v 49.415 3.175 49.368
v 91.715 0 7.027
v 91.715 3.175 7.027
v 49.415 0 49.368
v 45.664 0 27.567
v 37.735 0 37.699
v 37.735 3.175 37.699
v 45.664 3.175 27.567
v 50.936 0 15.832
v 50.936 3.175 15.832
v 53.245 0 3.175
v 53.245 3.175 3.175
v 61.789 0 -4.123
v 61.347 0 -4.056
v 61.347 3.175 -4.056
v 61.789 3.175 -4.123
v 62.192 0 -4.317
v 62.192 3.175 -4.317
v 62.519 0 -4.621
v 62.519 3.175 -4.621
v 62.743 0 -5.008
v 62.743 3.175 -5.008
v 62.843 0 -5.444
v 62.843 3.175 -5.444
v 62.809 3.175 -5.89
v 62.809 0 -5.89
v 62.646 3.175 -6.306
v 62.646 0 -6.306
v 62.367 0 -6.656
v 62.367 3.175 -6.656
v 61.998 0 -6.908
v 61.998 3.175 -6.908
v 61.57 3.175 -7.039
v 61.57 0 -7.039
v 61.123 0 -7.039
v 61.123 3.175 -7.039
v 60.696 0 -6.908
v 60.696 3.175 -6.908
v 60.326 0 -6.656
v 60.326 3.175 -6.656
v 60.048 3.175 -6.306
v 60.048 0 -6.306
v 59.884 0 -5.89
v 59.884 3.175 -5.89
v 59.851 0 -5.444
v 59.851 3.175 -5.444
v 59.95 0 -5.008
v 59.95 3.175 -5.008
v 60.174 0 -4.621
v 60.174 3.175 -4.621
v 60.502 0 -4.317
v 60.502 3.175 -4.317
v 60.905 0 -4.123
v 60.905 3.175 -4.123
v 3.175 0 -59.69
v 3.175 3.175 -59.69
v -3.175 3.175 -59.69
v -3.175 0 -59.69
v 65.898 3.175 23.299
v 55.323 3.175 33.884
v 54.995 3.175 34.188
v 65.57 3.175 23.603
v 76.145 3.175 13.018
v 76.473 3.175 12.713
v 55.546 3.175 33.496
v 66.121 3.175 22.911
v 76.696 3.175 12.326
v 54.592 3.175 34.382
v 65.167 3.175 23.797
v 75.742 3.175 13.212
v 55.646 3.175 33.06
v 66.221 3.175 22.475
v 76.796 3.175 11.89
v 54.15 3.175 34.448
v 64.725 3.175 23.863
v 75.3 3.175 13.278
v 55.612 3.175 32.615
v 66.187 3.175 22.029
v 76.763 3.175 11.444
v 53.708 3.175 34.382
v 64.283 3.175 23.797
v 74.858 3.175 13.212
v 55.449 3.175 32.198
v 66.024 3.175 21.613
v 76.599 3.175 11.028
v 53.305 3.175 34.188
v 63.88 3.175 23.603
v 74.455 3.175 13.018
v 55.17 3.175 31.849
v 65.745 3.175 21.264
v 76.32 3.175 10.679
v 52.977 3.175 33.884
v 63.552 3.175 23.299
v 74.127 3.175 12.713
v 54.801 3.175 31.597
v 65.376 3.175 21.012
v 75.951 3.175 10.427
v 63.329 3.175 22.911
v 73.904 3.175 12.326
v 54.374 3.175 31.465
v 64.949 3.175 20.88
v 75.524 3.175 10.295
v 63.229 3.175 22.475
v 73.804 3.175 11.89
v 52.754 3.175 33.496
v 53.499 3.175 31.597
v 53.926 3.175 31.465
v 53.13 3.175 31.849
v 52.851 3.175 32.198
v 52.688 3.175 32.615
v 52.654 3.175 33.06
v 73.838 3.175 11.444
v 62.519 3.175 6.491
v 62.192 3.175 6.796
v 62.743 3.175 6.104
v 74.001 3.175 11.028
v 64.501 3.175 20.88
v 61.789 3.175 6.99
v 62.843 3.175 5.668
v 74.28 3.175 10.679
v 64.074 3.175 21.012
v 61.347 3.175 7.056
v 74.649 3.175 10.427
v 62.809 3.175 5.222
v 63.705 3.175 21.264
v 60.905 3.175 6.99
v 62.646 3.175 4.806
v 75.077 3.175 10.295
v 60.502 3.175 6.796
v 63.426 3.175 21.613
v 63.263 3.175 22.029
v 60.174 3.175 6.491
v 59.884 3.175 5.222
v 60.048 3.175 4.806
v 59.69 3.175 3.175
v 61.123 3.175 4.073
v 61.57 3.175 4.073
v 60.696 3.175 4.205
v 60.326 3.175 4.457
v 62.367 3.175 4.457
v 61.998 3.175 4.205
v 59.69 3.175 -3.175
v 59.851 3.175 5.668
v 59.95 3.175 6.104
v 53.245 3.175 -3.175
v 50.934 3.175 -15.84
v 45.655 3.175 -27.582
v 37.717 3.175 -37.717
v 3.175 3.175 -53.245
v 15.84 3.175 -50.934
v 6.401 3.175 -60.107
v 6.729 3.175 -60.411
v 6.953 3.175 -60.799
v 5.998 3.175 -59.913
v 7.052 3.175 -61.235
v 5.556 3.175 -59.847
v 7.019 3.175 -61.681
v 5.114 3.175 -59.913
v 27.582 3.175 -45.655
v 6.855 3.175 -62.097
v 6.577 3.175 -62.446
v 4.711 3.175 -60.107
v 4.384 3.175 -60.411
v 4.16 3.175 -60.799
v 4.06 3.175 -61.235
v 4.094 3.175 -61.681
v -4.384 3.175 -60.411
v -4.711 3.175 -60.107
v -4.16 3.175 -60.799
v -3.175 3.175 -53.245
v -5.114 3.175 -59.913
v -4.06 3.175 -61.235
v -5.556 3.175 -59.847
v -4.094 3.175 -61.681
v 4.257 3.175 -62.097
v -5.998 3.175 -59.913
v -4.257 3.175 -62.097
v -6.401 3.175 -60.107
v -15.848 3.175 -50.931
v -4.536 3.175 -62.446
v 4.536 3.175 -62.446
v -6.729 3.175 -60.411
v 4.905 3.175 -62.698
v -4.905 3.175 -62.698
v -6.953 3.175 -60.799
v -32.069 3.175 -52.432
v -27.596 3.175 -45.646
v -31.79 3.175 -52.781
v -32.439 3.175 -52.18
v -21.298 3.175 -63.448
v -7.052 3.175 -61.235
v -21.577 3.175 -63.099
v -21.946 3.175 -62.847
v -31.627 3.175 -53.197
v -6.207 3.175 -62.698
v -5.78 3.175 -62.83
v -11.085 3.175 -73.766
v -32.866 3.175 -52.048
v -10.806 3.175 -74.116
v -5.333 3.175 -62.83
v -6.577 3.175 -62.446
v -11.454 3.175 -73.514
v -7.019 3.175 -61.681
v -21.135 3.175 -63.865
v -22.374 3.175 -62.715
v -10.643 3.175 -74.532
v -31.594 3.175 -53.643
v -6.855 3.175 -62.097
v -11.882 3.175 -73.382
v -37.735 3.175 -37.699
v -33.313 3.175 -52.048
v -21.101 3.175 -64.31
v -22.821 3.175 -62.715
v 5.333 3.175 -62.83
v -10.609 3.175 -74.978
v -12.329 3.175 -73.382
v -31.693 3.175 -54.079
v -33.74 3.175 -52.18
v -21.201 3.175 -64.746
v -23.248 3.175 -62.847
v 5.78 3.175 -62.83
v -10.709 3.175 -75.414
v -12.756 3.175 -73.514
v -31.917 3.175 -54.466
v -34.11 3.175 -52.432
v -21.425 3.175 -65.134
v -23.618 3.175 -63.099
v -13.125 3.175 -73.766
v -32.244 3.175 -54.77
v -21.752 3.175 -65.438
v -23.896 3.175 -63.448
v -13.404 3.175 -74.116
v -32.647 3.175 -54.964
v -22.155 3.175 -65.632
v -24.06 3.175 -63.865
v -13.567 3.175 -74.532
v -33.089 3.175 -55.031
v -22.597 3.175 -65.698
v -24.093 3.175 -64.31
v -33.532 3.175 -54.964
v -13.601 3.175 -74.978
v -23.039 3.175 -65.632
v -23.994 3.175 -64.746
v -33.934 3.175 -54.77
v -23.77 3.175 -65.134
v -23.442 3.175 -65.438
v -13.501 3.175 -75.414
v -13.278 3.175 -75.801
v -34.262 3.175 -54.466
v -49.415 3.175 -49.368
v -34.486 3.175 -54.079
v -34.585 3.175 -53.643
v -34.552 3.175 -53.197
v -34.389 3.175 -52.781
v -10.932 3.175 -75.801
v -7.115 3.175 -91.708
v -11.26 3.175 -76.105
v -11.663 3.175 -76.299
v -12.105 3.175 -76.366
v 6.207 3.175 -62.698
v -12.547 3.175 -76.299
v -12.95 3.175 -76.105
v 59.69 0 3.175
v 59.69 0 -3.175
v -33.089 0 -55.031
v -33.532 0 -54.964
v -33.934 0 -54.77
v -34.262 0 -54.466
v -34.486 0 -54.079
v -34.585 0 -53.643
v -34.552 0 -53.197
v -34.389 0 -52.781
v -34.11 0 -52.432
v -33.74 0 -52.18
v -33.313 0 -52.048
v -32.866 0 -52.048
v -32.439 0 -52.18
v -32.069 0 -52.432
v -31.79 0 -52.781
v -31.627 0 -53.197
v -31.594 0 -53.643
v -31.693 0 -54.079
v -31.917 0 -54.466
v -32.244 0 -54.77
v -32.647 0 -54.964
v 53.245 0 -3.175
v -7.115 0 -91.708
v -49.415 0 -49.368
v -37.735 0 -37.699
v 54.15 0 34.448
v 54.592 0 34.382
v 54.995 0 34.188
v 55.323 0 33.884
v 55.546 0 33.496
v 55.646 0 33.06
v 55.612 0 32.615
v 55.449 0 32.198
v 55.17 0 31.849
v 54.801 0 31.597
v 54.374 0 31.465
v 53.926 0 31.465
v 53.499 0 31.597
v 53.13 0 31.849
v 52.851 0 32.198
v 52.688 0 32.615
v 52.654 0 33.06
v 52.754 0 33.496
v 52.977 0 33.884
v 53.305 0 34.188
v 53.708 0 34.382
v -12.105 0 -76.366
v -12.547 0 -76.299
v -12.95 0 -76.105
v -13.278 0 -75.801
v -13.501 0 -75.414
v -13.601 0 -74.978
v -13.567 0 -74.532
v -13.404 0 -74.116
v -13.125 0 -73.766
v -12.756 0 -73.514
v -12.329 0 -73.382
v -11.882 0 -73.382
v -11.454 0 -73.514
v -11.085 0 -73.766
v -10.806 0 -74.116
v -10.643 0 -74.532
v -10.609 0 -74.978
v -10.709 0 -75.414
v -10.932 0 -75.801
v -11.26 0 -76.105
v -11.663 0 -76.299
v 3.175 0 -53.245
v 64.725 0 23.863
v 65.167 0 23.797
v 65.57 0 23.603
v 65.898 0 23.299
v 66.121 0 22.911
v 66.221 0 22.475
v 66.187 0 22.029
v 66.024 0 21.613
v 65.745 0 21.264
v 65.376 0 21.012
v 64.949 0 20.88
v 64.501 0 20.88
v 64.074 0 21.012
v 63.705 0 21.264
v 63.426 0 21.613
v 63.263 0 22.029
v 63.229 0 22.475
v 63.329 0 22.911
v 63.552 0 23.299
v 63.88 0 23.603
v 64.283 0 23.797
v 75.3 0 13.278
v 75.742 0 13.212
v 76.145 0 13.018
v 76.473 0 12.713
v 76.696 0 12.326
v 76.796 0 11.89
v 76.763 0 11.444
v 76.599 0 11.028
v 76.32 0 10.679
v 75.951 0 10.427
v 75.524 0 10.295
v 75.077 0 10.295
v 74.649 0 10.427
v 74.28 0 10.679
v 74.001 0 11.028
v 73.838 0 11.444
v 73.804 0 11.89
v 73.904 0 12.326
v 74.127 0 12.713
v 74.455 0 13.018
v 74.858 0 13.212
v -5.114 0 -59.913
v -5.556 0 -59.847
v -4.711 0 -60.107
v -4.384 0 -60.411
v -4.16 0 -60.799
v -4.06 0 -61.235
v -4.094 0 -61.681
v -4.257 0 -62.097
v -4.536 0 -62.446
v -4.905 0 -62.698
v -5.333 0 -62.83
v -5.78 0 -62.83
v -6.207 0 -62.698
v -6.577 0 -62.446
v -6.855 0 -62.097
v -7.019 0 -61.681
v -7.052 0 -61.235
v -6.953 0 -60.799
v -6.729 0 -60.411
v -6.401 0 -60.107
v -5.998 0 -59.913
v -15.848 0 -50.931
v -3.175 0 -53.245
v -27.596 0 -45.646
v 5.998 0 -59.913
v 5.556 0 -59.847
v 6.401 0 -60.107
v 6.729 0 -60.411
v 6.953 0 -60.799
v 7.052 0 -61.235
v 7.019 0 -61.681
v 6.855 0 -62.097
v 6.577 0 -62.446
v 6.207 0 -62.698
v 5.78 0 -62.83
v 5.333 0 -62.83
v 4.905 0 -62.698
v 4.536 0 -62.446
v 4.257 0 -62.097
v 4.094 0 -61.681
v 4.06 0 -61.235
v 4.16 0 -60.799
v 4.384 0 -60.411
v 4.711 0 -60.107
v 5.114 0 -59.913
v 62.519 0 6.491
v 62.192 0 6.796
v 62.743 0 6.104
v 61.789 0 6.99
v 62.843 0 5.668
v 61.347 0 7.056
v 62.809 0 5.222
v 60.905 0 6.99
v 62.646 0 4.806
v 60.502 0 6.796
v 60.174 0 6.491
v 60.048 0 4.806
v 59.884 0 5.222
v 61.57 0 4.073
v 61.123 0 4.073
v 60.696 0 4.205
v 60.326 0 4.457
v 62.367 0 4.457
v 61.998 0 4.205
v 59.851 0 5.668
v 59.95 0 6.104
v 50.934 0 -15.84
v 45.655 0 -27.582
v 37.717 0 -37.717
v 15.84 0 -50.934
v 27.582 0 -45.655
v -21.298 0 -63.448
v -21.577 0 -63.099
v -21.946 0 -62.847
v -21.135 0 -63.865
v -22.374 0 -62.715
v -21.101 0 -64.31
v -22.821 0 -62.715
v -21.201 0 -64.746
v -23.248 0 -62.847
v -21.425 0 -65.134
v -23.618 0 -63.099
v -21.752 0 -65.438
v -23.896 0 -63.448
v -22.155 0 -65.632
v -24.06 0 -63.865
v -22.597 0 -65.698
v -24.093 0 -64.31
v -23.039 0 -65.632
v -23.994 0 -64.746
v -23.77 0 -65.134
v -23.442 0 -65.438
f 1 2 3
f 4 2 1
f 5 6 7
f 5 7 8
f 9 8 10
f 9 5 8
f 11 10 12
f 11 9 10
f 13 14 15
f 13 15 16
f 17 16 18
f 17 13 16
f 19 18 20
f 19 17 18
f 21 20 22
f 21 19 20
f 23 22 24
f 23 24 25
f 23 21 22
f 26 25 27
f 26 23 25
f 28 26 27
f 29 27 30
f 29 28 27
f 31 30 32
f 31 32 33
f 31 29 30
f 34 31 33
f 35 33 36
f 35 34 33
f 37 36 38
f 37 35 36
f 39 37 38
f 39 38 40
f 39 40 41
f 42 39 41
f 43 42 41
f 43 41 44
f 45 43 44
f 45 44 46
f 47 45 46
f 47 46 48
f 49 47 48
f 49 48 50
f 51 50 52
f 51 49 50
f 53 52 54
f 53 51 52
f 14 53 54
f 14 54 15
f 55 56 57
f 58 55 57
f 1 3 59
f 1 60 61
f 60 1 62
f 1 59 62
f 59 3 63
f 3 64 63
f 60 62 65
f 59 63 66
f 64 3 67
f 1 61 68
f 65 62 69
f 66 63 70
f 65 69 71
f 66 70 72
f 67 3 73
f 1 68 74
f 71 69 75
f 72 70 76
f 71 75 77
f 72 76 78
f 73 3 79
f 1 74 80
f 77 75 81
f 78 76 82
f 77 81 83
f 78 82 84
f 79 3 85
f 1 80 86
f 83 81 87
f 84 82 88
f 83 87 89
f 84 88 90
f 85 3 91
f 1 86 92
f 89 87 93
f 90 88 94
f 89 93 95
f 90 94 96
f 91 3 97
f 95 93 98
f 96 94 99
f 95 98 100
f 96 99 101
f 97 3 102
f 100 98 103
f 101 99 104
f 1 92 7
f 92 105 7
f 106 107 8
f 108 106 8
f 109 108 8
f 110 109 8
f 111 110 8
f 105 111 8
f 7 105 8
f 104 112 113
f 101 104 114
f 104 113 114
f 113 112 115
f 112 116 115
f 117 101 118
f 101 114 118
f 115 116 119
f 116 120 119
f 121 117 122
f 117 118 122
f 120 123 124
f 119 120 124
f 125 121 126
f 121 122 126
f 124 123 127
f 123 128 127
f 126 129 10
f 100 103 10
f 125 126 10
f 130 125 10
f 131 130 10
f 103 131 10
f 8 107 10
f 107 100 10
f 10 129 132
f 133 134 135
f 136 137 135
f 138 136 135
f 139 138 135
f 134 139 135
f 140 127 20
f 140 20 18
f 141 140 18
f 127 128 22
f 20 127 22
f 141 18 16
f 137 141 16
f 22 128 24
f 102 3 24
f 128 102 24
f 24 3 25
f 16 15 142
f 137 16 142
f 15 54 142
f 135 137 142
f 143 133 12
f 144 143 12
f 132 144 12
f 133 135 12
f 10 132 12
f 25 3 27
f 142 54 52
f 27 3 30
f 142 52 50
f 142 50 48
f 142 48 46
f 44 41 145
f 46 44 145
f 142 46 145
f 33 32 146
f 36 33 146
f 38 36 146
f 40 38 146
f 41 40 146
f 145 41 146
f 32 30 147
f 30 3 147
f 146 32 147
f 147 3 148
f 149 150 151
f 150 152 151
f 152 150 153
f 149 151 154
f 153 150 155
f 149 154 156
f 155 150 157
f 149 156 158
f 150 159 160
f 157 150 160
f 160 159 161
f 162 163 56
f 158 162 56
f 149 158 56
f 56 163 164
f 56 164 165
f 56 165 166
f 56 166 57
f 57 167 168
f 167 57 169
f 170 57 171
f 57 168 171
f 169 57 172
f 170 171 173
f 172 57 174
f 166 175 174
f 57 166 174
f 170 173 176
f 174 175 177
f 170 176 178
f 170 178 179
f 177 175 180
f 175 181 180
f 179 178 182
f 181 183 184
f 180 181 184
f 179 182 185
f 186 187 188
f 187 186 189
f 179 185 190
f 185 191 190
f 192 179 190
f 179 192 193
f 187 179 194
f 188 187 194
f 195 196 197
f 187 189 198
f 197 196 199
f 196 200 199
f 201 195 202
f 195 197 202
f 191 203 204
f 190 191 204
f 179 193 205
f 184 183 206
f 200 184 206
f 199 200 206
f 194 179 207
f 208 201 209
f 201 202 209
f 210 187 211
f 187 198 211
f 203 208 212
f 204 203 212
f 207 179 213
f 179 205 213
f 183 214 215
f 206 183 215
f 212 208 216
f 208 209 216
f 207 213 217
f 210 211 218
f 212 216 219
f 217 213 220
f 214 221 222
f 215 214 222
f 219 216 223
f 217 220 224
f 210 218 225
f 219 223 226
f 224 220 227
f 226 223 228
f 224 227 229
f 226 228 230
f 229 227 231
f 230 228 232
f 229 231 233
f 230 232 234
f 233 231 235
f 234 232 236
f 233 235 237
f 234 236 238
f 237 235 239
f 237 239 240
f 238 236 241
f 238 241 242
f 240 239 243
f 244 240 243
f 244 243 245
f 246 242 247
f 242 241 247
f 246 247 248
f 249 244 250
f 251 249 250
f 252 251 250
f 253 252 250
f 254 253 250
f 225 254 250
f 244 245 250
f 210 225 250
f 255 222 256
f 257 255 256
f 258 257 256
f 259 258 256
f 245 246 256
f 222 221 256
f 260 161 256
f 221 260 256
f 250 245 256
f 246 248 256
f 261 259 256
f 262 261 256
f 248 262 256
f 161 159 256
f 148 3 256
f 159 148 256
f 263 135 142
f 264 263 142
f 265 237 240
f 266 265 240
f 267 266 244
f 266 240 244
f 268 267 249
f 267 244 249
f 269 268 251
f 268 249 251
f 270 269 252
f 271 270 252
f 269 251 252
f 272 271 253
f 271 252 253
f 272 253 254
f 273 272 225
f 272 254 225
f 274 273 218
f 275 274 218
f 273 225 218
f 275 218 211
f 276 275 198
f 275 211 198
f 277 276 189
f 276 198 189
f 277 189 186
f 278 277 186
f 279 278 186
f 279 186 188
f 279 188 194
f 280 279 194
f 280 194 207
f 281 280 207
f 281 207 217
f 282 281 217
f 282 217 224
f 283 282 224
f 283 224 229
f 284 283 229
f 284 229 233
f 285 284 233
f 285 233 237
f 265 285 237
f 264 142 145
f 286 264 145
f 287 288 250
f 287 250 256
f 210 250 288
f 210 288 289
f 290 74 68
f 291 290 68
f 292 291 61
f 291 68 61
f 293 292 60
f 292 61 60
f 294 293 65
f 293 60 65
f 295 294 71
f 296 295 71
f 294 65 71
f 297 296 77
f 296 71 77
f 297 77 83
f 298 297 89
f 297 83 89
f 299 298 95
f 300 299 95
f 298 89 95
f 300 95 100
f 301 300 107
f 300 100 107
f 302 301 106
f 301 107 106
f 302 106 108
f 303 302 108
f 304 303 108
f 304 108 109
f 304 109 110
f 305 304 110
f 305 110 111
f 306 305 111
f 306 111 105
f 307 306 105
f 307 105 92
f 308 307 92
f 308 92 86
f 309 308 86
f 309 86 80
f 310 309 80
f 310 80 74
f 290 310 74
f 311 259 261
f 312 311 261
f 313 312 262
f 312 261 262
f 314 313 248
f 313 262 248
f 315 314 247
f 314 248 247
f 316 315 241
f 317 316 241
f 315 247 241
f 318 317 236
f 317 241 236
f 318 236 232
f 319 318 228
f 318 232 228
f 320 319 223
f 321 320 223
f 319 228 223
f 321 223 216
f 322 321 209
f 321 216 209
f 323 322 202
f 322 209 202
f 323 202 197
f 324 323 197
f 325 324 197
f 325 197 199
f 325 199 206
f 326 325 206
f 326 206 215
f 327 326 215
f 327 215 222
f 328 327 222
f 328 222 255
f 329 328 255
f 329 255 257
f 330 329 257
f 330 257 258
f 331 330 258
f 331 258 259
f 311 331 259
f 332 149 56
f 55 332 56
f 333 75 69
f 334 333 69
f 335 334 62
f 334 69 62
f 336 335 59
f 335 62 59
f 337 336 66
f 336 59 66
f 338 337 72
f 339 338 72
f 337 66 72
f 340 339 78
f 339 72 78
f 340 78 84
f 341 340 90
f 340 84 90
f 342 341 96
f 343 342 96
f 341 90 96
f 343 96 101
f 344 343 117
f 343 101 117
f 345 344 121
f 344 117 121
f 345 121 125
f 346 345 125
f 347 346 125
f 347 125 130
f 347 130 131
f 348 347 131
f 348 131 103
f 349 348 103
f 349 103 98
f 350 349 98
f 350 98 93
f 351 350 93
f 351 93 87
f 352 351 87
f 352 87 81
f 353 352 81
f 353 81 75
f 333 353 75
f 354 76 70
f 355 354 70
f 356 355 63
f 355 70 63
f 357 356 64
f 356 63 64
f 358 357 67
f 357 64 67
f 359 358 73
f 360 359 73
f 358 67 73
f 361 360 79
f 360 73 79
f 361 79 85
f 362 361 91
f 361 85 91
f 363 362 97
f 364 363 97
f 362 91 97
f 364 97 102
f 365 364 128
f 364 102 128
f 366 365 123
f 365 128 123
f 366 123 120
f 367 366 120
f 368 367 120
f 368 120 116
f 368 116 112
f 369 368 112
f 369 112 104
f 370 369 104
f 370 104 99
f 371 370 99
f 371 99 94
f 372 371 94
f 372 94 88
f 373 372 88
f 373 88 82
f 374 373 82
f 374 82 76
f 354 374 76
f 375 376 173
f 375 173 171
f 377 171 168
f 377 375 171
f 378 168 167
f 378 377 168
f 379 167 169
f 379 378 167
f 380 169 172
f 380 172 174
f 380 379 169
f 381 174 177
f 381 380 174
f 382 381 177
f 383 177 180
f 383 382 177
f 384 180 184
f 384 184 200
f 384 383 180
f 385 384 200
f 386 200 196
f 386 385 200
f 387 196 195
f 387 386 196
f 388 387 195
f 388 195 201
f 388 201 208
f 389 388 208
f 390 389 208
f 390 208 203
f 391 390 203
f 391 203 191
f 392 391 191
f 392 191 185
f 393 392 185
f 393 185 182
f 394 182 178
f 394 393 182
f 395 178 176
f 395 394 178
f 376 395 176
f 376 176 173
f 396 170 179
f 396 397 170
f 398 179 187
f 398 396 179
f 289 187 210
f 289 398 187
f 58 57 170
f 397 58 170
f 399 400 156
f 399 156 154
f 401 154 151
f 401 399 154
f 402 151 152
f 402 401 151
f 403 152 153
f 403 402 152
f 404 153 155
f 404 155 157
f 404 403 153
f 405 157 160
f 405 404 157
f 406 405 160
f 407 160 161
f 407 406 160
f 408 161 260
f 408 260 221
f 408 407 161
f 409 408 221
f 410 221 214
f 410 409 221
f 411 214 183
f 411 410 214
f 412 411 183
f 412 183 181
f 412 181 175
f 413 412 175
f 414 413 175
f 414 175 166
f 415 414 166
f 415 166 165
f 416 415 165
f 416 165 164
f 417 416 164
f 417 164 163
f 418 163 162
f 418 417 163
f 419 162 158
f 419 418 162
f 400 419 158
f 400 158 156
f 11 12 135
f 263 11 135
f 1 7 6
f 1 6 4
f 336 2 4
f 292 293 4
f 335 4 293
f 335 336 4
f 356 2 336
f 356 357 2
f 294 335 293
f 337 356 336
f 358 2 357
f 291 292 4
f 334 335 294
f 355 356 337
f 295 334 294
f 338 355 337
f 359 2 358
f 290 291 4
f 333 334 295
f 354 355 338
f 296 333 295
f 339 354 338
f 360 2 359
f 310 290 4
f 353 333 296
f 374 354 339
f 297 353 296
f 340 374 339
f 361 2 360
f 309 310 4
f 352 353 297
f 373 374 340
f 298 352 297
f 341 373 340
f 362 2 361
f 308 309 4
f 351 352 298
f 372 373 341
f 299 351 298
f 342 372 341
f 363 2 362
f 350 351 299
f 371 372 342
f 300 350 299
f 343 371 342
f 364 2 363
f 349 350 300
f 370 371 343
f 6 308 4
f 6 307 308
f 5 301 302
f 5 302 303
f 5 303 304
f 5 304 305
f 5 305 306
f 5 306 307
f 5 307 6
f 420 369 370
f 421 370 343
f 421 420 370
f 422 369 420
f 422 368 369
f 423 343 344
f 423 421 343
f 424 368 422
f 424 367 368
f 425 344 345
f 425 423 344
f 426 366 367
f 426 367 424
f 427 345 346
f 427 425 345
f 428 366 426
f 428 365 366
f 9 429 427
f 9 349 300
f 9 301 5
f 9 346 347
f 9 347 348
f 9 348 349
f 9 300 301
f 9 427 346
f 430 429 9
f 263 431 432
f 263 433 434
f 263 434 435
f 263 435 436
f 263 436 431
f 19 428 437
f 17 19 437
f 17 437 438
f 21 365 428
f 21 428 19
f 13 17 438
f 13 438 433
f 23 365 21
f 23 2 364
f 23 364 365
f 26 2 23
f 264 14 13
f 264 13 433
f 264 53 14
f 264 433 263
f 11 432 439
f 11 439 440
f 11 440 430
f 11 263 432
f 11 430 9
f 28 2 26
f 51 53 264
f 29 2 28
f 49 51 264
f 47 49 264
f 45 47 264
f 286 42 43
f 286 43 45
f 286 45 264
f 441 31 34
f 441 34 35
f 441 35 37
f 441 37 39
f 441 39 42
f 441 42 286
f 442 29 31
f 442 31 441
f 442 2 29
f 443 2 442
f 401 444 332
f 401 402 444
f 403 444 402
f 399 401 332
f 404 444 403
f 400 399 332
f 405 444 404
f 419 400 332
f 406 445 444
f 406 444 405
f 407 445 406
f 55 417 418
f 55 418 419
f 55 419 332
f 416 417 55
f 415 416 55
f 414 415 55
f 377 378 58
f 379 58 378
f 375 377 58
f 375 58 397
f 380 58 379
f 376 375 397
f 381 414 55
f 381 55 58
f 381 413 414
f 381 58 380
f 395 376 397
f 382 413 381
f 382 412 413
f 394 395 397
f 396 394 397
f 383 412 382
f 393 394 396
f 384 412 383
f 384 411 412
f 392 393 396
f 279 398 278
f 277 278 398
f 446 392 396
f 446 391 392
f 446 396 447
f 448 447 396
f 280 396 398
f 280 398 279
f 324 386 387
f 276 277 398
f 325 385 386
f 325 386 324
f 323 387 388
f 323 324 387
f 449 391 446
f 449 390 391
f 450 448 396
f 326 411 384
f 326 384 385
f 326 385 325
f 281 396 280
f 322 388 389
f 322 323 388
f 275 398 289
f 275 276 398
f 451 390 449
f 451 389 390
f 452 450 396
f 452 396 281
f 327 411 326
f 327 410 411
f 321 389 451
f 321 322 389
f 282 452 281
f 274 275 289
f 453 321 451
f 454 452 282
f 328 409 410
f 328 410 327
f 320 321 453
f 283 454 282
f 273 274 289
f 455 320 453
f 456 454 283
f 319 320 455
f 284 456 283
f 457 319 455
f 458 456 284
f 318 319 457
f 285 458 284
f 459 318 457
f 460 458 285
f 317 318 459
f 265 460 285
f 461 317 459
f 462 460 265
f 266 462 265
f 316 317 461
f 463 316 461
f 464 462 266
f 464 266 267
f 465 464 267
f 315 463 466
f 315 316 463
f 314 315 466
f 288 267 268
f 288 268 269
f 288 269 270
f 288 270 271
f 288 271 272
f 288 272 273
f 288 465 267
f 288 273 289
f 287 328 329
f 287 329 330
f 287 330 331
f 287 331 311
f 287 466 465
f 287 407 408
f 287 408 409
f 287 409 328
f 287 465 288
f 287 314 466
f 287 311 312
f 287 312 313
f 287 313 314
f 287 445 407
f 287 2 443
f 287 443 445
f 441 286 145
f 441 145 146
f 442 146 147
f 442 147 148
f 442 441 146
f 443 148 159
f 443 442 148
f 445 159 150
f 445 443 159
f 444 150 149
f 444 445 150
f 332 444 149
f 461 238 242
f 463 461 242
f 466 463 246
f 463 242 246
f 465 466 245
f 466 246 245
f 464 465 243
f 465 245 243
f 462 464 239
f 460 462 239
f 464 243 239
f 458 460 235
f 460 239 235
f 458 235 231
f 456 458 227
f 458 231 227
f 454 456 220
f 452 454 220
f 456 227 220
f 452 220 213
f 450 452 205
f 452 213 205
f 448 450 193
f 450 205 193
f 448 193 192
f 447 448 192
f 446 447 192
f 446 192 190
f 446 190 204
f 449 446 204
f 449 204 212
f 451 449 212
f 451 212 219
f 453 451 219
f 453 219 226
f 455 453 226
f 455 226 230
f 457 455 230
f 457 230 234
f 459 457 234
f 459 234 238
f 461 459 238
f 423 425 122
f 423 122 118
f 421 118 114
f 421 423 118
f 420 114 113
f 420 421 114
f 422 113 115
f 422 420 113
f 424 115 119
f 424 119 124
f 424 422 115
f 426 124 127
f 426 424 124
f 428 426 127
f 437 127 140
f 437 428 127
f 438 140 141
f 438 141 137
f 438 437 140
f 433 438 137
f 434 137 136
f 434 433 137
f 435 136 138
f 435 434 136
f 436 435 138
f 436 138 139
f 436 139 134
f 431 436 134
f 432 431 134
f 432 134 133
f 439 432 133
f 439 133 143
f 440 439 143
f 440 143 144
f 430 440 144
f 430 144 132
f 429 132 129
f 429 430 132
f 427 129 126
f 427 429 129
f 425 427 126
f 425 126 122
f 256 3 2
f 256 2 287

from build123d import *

# Parameters (mm, degrees)
SKETCH1_R           = 1.5
SKETCH1_R_2         = 53.34
BOSS_EXTRUDE1_DEPTH = 3.175
CUT_EXTRUDE3_DEPTH  = 140.736059076
CUT_EXTRUDE4_DEPTH  = 140.736059076
CUT_EXTRUDE5_DEPTH  = 140.736059076
SKETCH6_R           = 1.5
CUT_EXTRUDE6_DEPTH  = 130.738840902


with BuildPart() as part:
    # Sketch1 → Boss-Extrude1 (new body)
    with BuildSketch(Plane(origin=(0, 0, 0), x_dir=(1, 0, 0), z_dir=(0, 1, 0))):
        Polygon((0.047005036, -98.782806148), (-98.782806148, -0.047005036), (-0.047005036, 98.782806148), (98.782806148, 0.047005036), align=None)
        with Locations(Location((-61.346730494, 5.55625, 0), (0, 0, 270))):
            Circle(SKETCH1_R, mode=Mode.SUBTRACT)
        with Locations(Location((-61.346730494, -5.55625, 0), (0, 0, 270))):
            Circle(SKETCH1_R, mode=Mode.SUBTRACT)
        with Locations(Location((-5.55625, -61.346730494, 0), (0, 0, 270))):
            Circle(SKETCH1_R, mode=Mode.SUBTRACT)
        with Locations(Location((5.55625, -61.346730494, 0), (0, 0, 270))):
            Circle(SKETCH1_R, mode=Mode.SUBTRACT)
        with Locations(Location((61.346730494, -5.55625, 0), (0, 0, 270))):
            Circle(SKETCH1_R, mode=Mode.SUBTRACT)
        with Locations(Location((61.346730494, 5.55625, 0), (0, 0, 270))):
            Circle(SKETCH1_R, mode=Mode.SUBTRACT)
        with Locations(Location((5.55625, 61.346730494, 0), (0, 0, 270))):
            Circle(SKETCH1_R, mode=Mode.SUBTRACT)
        with Locations(Location((-5.55625, 61.346730494, 0), (0, 0, 270))):
            Circle(SKETCH1_R, mode=Mode.SUBTRACT)
        with Locations(Location((0, 0, 0), (0, 0, 270))):
            Circle(SKETCH1_R_2, mode=Mode.SUBTRACT)
    extrude(amount=BOSS_EXTRUDE1_DEPTH)

    # Sketch2 → Cut-Extrude3 (cut, through all)
    with BuildSketch(Plane(origin=(0, 3.175, 0), x_dir=(1, 0, 0), z_dir=(0, 1, 0))):
        Polygon((3.175, 53.34), (3.175, 59.69), (-3.175, 59.69), (-3.175, 53.34), (-3.175, 52.244537665), (3.175, 52.244537665), align=None)
        Polygon((53.34, -3.175), (59.69, -3.175), (59.69, 3.175), (53.34, 3.175), (52.244537665, 3.175), (52.244537665, -3.175), align=None)
        Polygon((-3.175, -53.34), (-3.175, -59.69), (3.175, -59.69), (3.175, -53.34), (3.175, -52.244537665), (-3.175, -52.244537665), align=None)
        Polygon((-53.34, 3.175), (-59.69, 3.175), (-59.69, -3.175), (-53.34, -3.175), (-52.244537665, -3.175), (-52.244537665, 3.175), align=None)
    extrude(amount=-CUT_EXTRUDE3_DEPTH, mode=Mode.SUBTRACT)

    # Sketch3 → Cut-Extrude4 (cut, through all)
    with BuildSketch(Plane(origin=(0, 3.175, 0), x_dir=(1, 0, 0), z_dir=(0, 1, 0))):
        Polygon((-49.414905592, 49.367900556), (49.414905592, -49.367900556), (0.047005036, -98.782806148), (-98.782806148, -0.047005036), align=None)
    extrude(amount=-CUT_EXTRUDE4_DEPTH, mode=Mode.SUBTRACT)

    # Sketch5 → Cut-Extrude5 (cut, through all)
    with BuildSketch(Plane(origin=(0, 3.175, 0), x_dir=(1, 0, 0), z_dir=(0, 1, 0))):
        Polygon((98.782806148, 0.047005036), (91.71510385, -7.027426688), (-7.114707335, 91.708374424), (-0.047005036, 98.782806148), align=None)
    extrude(amount=-CUT_EXTRUDE5_DEPTH, mode=Mode.SUBTRACT)

    # Sketch6 → Cut-Extrude6 (cut, through all)
    with BuildSketch(Plane(origin=(0, 3.175, 0), x_dir=(1, 0, 0), z_dir=(0, 1, 0))):
        with Locations(Location((64.725061333, -22.363275374, 0), (0, 0, 270))):
            Circle(SKETCH6_R)
        with Locations(Location((75.300110897, -11.778156907, 0), (0, 0, 270))):
            Circle(SKETCH6_R)
        with Locations(Location((-12.105083926, 74.865628777, 0), (0, 0, 90))):
            Circle(SKETCH6_R)
        with Locations(Location((-22.597274037, 64.198372666, 0), (0, 0, 90))):
            Circle(SKETCH6_R)
        with Locations(Location((54.150011768, -32.948393841, 0), (0, 0, 270))):
            Circle(SKETCH6_R)
        with Locations(Location((-33.089464147, 53.531116555, 0), (0, 0, 90))):
            Circle(SKETCH6_R)
    extrude(amount=-CUT_EXTRUDE6_DEPTH, mode=Mode.SUBTRACT)


solid = part.part
